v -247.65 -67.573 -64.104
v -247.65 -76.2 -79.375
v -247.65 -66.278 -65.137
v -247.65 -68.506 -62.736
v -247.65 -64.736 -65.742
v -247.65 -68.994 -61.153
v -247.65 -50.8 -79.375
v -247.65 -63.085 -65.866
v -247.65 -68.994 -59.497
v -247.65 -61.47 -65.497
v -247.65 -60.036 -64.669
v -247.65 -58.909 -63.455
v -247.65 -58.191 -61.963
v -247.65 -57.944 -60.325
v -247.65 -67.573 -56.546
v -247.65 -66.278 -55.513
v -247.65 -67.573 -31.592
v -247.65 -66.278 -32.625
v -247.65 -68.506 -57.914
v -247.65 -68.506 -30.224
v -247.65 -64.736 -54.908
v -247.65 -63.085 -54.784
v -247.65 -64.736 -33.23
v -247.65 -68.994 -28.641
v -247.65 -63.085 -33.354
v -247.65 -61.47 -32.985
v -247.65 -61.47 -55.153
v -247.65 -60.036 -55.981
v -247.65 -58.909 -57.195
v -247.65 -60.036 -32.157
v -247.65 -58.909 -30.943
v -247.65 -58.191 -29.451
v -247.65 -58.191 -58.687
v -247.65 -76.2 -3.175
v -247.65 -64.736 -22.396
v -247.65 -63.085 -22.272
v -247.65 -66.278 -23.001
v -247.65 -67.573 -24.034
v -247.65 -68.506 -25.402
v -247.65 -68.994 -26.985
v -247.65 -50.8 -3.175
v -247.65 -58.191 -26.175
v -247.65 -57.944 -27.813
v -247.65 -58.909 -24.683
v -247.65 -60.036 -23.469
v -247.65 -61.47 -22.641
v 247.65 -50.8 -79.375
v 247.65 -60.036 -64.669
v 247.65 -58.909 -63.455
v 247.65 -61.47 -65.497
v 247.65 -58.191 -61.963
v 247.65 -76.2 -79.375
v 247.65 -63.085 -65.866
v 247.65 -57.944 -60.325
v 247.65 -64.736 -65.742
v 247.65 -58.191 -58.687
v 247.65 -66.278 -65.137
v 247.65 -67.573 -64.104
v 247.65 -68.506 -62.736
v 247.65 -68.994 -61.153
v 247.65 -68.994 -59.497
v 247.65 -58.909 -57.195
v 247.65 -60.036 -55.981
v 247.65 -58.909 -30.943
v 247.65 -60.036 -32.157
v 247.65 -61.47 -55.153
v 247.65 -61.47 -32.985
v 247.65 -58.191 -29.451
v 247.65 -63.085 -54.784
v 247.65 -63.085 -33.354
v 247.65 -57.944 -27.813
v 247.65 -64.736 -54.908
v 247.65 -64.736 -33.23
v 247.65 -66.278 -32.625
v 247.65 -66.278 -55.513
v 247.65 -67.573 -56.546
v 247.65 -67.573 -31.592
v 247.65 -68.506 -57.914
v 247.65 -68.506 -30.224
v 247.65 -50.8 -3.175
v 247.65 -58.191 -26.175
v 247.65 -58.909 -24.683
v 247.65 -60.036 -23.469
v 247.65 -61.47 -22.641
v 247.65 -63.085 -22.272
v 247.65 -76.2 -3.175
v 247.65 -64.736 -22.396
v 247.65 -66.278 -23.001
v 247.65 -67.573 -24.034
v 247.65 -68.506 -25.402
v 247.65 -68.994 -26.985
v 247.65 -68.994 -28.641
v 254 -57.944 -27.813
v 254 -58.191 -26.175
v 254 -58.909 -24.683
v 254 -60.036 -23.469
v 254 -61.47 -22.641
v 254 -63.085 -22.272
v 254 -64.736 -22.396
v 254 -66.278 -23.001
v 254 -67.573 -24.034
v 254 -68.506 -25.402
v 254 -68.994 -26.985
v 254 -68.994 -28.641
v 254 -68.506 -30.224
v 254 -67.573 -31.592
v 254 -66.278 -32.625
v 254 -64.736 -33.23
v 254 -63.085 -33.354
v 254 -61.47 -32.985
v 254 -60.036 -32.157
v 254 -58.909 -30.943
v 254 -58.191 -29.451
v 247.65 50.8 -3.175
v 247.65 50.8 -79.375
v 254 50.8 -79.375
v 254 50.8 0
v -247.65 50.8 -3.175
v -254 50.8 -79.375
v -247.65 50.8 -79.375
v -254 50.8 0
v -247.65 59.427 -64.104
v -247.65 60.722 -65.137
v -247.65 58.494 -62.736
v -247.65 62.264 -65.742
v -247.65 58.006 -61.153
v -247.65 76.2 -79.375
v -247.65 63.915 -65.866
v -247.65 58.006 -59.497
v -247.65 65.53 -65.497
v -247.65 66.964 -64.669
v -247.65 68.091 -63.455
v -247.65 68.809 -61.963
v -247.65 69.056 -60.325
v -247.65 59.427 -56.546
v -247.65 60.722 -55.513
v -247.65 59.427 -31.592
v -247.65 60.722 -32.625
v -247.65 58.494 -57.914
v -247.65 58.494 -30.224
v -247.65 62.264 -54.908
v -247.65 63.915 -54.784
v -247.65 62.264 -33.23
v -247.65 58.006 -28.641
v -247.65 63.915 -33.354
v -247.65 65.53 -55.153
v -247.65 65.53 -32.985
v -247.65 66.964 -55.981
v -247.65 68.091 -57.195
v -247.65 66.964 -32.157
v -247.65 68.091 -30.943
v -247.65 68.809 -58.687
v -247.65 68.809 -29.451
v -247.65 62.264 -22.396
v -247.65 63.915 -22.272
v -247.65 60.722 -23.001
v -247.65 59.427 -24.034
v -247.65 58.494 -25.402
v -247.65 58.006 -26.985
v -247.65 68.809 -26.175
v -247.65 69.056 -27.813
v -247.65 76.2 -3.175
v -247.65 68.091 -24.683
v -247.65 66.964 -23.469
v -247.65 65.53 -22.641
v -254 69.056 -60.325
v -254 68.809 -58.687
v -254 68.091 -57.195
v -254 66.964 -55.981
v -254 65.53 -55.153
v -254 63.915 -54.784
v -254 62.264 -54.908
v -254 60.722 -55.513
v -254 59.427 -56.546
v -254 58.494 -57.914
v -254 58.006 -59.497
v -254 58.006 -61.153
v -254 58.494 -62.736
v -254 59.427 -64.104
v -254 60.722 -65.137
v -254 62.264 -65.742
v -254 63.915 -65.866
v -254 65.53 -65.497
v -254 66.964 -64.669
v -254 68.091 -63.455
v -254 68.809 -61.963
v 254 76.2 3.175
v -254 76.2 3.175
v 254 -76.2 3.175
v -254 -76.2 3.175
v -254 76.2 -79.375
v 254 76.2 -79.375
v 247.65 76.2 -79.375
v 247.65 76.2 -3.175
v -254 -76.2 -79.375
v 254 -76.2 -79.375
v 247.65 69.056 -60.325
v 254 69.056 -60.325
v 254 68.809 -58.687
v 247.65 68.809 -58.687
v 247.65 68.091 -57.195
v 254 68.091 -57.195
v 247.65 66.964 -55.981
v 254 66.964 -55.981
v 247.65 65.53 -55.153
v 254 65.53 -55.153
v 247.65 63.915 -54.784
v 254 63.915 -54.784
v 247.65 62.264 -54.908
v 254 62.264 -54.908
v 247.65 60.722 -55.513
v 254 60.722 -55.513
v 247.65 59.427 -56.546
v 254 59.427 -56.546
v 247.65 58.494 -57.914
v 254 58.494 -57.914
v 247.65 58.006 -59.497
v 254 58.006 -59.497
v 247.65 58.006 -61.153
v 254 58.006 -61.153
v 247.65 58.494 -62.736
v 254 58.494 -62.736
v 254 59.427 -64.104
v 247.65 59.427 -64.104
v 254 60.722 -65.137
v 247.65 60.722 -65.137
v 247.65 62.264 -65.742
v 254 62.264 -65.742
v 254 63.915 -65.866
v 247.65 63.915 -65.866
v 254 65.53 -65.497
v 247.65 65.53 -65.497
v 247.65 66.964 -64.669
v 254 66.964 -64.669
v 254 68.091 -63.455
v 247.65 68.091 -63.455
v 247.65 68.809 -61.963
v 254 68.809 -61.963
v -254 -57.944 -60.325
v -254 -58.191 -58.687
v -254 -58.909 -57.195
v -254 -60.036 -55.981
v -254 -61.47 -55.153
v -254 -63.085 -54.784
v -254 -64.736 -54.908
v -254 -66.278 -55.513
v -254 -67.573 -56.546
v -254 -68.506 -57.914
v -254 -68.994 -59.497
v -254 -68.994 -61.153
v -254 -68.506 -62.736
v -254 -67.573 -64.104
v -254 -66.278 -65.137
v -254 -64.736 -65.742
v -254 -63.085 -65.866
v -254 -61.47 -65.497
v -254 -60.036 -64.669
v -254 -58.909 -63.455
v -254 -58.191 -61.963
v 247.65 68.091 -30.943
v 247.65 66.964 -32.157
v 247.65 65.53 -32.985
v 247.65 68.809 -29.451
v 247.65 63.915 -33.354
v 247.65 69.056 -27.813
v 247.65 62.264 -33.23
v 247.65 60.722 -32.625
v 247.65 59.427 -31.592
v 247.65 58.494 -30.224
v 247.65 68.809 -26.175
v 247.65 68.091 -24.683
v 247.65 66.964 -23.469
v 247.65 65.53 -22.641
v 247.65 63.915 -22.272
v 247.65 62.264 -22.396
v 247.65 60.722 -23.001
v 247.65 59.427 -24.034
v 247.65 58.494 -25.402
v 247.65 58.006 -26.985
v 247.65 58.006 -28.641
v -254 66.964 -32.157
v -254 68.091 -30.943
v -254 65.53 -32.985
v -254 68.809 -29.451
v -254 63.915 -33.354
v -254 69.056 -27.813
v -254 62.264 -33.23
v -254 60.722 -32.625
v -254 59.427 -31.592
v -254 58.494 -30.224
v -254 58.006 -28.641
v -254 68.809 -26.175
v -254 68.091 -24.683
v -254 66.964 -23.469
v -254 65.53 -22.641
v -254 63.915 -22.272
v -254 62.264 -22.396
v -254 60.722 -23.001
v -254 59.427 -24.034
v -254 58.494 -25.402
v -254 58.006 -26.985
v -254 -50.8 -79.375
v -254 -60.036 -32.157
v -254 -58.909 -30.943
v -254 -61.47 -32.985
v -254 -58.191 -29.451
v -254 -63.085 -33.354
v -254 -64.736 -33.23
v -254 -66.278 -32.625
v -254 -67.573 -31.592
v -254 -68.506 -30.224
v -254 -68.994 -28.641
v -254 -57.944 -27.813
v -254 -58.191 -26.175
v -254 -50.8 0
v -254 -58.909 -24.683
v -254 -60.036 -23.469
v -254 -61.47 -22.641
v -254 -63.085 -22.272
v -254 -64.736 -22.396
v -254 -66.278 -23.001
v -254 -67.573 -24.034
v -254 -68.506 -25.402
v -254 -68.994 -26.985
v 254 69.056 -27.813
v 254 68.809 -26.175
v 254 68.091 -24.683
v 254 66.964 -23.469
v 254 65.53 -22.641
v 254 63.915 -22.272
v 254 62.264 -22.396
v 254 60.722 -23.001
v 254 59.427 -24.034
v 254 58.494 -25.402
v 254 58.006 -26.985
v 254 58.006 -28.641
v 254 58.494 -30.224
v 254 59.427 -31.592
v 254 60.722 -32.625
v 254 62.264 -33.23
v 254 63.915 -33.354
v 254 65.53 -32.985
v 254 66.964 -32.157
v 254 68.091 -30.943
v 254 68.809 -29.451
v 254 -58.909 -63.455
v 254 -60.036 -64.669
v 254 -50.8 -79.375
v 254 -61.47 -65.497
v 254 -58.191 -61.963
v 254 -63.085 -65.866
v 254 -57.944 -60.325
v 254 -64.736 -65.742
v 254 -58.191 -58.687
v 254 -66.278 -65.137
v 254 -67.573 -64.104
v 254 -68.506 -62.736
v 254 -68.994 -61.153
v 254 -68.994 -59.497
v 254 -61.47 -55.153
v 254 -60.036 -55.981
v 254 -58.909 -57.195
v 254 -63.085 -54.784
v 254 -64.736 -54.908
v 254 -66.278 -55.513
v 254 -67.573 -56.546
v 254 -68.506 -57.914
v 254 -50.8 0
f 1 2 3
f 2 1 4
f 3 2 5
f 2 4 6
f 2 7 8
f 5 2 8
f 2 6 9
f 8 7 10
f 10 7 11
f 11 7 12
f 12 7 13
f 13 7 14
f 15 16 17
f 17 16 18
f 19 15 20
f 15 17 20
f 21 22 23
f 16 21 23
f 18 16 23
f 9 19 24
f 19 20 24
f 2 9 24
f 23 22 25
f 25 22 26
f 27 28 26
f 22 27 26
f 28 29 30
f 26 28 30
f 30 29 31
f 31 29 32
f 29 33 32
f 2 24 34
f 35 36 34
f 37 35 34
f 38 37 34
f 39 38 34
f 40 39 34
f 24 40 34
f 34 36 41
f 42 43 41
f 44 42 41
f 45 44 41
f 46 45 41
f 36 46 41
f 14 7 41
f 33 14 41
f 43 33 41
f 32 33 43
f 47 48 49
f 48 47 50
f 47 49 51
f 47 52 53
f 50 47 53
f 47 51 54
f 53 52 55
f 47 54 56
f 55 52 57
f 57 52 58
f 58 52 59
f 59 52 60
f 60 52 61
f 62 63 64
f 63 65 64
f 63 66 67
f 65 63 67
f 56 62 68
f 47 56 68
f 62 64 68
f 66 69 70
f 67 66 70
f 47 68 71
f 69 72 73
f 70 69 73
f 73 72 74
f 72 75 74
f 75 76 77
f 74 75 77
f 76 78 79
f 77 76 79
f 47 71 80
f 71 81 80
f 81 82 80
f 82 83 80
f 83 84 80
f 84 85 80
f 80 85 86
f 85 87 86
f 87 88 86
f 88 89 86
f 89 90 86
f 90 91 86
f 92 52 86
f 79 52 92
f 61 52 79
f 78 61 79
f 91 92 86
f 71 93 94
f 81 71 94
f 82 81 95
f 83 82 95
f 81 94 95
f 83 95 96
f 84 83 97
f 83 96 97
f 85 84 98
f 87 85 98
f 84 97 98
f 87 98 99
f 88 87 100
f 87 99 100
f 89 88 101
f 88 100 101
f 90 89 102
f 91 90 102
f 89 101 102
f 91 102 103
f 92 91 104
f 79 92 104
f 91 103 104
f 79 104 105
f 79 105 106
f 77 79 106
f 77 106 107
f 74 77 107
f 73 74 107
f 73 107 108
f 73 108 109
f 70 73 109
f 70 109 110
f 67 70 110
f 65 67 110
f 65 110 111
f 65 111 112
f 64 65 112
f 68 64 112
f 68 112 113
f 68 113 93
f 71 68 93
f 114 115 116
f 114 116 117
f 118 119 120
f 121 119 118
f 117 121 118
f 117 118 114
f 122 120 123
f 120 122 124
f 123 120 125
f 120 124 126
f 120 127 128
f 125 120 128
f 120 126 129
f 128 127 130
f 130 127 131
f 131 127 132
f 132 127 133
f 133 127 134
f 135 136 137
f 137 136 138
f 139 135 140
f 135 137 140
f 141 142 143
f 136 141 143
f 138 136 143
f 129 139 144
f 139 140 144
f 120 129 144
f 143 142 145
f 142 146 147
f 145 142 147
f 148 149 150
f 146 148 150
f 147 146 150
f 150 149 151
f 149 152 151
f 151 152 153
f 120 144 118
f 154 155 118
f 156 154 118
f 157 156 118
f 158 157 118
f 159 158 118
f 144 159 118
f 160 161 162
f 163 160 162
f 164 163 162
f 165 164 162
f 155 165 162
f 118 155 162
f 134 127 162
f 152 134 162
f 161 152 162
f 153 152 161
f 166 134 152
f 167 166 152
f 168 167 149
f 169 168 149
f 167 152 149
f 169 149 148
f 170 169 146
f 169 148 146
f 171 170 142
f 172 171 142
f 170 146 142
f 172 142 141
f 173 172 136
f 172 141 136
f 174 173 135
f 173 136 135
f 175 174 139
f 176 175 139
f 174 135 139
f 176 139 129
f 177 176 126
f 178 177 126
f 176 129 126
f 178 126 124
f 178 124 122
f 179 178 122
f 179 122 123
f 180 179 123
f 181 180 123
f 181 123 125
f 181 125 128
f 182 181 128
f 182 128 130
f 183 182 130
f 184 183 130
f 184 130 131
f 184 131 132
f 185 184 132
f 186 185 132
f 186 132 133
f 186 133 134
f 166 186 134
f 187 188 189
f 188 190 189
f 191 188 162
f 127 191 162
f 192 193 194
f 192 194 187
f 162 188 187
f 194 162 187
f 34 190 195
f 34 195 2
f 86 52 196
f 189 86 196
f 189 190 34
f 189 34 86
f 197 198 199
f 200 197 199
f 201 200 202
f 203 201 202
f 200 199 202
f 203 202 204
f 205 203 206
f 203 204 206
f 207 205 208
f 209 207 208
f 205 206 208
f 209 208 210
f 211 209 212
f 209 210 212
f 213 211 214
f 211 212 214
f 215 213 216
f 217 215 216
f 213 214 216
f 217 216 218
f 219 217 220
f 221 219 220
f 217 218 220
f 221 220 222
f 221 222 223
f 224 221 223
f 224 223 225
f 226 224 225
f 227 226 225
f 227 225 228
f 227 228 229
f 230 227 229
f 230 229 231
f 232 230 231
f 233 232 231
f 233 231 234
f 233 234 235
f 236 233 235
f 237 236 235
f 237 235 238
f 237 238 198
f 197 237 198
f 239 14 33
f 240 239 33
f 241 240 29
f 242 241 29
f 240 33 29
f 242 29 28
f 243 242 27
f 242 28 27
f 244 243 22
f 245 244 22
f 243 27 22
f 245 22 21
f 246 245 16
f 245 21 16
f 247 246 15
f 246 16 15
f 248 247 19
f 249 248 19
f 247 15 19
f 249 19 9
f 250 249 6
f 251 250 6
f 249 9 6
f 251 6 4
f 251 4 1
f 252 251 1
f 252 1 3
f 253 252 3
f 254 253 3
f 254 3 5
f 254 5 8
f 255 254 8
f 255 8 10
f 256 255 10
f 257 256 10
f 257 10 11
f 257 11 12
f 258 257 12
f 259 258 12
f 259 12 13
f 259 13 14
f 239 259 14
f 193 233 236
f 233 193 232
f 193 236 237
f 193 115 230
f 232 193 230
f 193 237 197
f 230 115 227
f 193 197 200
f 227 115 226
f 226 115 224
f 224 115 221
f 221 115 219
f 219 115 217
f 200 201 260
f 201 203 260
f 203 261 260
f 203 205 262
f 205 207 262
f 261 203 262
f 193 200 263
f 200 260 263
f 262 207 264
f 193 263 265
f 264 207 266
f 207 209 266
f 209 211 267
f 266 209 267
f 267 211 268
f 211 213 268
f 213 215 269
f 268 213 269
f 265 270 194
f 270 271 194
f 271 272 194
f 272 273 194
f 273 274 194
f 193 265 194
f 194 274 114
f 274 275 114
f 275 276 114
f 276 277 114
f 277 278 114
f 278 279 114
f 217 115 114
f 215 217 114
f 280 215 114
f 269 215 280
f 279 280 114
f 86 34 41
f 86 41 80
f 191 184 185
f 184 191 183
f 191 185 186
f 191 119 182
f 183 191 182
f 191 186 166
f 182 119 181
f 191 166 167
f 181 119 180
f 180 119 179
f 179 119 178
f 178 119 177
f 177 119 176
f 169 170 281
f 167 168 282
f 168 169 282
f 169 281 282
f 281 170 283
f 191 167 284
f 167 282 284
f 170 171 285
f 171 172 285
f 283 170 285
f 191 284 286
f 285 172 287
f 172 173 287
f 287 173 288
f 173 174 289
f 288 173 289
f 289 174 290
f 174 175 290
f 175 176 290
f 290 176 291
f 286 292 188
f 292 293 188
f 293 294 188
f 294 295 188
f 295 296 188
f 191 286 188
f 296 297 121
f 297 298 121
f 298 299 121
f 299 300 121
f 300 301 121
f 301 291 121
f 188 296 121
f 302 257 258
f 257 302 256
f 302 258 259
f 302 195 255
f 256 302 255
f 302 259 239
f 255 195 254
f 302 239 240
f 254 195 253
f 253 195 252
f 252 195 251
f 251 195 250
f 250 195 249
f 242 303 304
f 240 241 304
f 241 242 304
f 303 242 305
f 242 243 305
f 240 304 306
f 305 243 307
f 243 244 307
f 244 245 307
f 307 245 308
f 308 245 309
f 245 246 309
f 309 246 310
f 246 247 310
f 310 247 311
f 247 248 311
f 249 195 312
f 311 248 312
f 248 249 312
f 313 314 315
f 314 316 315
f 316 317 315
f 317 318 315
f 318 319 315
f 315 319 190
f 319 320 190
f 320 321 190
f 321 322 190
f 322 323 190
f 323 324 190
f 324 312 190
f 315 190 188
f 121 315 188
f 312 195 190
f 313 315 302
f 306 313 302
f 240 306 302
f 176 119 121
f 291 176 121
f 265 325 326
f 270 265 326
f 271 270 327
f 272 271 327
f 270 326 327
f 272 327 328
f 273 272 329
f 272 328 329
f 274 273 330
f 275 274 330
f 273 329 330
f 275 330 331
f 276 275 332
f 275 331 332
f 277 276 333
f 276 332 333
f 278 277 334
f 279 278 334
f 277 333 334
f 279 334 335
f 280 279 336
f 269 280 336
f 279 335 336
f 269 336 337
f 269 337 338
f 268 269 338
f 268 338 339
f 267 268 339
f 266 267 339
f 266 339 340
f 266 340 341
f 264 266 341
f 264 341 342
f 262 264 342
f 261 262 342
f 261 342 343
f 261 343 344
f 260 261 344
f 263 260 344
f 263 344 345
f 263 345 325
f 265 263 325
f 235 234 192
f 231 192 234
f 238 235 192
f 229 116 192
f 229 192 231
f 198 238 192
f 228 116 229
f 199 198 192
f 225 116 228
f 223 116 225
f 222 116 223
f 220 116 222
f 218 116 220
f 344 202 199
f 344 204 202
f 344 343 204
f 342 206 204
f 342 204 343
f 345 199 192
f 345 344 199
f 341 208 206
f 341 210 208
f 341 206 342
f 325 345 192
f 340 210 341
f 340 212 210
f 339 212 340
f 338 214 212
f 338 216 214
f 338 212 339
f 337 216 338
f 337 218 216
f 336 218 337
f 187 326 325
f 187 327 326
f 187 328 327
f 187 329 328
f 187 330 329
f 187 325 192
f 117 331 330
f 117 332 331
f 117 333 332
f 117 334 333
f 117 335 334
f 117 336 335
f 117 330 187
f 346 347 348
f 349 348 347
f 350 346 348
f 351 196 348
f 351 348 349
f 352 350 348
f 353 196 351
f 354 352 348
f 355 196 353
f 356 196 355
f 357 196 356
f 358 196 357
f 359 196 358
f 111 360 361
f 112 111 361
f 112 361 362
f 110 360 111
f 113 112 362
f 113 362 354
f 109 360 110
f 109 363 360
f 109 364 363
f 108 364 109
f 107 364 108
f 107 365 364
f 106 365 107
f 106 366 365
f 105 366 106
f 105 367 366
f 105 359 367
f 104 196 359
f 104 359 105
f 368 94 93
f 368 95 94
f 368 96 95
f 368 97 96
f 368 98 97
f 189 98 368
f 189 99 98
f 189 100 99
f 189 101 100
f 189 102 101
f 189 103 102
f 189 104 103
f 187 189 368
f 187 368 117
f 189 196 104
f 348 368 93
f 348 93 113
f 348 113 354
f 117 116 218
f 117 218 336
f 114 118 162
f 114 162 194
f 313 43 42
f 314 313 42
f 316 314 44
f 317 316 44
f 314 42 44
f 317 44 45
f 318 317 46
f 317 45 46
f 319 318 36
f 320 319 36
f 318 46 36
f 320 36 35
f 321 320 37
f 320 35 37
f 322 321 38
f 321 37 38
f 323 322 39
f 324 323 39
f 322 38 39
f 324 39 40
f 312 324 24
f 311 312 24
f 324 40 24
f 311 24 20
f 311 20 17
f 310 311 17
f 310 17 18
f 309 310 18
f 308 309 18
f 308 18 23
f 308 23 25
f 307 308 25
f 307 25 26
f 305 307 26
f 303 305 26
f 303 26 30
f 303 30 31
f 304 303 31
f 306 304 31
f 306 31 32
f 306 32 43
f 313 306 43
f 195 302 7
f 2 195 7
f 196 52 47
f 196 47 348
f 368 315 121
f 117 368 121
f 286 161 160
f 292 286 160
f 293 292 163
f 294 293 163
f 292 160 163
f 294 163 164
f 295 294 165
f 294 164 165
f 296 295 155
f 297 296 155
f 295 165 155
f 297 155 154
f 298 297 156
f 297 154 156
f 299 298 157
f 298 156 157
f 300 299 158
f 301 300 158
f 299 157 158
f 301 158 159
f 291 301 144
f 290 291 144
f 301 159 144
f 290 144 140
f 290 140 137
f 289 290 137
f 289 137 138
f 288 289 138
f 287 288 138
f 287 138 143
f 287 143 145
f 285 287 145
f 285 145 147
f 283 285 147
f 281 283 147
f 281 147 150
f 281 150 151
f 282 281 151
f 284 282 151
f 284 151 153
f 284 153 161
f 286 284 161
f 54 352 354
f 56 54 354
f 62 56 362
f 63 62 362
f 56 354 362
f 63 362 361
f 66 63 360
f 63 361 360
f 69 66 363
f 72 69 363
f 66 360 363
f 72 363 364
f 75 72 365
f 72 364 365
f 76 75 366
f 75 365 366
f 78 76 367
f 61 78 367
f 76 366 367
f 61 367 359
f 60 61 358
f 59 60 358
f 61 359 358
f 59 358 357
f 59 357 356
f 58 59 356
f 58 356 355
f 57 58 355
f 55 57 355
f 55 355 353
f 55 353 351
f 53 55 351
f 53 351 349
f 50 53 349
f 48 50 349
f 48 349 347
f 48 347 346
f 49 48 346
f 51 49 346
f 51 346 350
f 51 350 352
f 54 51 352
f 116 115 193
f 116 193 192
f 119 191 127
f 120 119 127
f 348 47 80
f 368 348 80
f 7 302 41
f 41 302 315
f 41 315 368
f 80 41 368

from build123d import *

# Parameters (mm, degrees)
F0_W          = 508
F0_H          = 6.35
F1_DEPTH      = 76.2
F2_W          = 6.35
F2_H          = 76.2
F3_DEPTH      = 76.2
F4_W          = 101.6
F4_H          = 79.375
F5_DEPTH      = 254.001
F5_DEPTH_BACK = 254.001
F6_R          = 5.55625
F7_DEPTH      = 508.001


with BuildPart() as f1:
    # F0 (on Front) → F1 (new body, symmetric)
    with BuildSketch(Plane.XZ):
        Rectangle(F0_W, F0_H)
    extrude(amount=F1_DEPTH, both=True)

    # F2 (on Front) → F3 (join, symmetric)
    with BuildSketch(Plane.XZ):
        with Locations((-250.825, -41.275)):
            Rectangle(F2_W, F2_H)
        with Locations((250.825, -41.275)):
            Rectangle(F2_W, F2_H)
    extrude(amount=F3_DEPTH, both=True)

    # F4 (on Right) → F5 (cut, two sides)
    with BuildSketch(Plane.YZ) as f5_sk:
        with Locations((0, -39.6875)):
            Rectangle(F4_W, F4_H)
    extrude(amount=-F5_DEPTH, mode=Mode.SUBTRACT)
    extrude(f5_sk.sketch, amount=F5_DEPTH_BACK, mode=Mode.SUBTRACT)

    # F6 (on face) → F7 (cut, through all)
    with BuildSketch(Plane.YZ.offset(254)):
        with Locations((-63.5, -27.813)):
            Circle(F6_R)
        with Locations((-63.5, -60.325)):
            Circle(F6_R)
        with Locations((63.5, -27.813)):
            Circle(F6_R)
        with Locations((63.5, -60.325)):
            Circle(F6_R)
    extrude(amount=-F7_DEPTH, mode=Mode.SUBTRACT)


solid = f1.part
